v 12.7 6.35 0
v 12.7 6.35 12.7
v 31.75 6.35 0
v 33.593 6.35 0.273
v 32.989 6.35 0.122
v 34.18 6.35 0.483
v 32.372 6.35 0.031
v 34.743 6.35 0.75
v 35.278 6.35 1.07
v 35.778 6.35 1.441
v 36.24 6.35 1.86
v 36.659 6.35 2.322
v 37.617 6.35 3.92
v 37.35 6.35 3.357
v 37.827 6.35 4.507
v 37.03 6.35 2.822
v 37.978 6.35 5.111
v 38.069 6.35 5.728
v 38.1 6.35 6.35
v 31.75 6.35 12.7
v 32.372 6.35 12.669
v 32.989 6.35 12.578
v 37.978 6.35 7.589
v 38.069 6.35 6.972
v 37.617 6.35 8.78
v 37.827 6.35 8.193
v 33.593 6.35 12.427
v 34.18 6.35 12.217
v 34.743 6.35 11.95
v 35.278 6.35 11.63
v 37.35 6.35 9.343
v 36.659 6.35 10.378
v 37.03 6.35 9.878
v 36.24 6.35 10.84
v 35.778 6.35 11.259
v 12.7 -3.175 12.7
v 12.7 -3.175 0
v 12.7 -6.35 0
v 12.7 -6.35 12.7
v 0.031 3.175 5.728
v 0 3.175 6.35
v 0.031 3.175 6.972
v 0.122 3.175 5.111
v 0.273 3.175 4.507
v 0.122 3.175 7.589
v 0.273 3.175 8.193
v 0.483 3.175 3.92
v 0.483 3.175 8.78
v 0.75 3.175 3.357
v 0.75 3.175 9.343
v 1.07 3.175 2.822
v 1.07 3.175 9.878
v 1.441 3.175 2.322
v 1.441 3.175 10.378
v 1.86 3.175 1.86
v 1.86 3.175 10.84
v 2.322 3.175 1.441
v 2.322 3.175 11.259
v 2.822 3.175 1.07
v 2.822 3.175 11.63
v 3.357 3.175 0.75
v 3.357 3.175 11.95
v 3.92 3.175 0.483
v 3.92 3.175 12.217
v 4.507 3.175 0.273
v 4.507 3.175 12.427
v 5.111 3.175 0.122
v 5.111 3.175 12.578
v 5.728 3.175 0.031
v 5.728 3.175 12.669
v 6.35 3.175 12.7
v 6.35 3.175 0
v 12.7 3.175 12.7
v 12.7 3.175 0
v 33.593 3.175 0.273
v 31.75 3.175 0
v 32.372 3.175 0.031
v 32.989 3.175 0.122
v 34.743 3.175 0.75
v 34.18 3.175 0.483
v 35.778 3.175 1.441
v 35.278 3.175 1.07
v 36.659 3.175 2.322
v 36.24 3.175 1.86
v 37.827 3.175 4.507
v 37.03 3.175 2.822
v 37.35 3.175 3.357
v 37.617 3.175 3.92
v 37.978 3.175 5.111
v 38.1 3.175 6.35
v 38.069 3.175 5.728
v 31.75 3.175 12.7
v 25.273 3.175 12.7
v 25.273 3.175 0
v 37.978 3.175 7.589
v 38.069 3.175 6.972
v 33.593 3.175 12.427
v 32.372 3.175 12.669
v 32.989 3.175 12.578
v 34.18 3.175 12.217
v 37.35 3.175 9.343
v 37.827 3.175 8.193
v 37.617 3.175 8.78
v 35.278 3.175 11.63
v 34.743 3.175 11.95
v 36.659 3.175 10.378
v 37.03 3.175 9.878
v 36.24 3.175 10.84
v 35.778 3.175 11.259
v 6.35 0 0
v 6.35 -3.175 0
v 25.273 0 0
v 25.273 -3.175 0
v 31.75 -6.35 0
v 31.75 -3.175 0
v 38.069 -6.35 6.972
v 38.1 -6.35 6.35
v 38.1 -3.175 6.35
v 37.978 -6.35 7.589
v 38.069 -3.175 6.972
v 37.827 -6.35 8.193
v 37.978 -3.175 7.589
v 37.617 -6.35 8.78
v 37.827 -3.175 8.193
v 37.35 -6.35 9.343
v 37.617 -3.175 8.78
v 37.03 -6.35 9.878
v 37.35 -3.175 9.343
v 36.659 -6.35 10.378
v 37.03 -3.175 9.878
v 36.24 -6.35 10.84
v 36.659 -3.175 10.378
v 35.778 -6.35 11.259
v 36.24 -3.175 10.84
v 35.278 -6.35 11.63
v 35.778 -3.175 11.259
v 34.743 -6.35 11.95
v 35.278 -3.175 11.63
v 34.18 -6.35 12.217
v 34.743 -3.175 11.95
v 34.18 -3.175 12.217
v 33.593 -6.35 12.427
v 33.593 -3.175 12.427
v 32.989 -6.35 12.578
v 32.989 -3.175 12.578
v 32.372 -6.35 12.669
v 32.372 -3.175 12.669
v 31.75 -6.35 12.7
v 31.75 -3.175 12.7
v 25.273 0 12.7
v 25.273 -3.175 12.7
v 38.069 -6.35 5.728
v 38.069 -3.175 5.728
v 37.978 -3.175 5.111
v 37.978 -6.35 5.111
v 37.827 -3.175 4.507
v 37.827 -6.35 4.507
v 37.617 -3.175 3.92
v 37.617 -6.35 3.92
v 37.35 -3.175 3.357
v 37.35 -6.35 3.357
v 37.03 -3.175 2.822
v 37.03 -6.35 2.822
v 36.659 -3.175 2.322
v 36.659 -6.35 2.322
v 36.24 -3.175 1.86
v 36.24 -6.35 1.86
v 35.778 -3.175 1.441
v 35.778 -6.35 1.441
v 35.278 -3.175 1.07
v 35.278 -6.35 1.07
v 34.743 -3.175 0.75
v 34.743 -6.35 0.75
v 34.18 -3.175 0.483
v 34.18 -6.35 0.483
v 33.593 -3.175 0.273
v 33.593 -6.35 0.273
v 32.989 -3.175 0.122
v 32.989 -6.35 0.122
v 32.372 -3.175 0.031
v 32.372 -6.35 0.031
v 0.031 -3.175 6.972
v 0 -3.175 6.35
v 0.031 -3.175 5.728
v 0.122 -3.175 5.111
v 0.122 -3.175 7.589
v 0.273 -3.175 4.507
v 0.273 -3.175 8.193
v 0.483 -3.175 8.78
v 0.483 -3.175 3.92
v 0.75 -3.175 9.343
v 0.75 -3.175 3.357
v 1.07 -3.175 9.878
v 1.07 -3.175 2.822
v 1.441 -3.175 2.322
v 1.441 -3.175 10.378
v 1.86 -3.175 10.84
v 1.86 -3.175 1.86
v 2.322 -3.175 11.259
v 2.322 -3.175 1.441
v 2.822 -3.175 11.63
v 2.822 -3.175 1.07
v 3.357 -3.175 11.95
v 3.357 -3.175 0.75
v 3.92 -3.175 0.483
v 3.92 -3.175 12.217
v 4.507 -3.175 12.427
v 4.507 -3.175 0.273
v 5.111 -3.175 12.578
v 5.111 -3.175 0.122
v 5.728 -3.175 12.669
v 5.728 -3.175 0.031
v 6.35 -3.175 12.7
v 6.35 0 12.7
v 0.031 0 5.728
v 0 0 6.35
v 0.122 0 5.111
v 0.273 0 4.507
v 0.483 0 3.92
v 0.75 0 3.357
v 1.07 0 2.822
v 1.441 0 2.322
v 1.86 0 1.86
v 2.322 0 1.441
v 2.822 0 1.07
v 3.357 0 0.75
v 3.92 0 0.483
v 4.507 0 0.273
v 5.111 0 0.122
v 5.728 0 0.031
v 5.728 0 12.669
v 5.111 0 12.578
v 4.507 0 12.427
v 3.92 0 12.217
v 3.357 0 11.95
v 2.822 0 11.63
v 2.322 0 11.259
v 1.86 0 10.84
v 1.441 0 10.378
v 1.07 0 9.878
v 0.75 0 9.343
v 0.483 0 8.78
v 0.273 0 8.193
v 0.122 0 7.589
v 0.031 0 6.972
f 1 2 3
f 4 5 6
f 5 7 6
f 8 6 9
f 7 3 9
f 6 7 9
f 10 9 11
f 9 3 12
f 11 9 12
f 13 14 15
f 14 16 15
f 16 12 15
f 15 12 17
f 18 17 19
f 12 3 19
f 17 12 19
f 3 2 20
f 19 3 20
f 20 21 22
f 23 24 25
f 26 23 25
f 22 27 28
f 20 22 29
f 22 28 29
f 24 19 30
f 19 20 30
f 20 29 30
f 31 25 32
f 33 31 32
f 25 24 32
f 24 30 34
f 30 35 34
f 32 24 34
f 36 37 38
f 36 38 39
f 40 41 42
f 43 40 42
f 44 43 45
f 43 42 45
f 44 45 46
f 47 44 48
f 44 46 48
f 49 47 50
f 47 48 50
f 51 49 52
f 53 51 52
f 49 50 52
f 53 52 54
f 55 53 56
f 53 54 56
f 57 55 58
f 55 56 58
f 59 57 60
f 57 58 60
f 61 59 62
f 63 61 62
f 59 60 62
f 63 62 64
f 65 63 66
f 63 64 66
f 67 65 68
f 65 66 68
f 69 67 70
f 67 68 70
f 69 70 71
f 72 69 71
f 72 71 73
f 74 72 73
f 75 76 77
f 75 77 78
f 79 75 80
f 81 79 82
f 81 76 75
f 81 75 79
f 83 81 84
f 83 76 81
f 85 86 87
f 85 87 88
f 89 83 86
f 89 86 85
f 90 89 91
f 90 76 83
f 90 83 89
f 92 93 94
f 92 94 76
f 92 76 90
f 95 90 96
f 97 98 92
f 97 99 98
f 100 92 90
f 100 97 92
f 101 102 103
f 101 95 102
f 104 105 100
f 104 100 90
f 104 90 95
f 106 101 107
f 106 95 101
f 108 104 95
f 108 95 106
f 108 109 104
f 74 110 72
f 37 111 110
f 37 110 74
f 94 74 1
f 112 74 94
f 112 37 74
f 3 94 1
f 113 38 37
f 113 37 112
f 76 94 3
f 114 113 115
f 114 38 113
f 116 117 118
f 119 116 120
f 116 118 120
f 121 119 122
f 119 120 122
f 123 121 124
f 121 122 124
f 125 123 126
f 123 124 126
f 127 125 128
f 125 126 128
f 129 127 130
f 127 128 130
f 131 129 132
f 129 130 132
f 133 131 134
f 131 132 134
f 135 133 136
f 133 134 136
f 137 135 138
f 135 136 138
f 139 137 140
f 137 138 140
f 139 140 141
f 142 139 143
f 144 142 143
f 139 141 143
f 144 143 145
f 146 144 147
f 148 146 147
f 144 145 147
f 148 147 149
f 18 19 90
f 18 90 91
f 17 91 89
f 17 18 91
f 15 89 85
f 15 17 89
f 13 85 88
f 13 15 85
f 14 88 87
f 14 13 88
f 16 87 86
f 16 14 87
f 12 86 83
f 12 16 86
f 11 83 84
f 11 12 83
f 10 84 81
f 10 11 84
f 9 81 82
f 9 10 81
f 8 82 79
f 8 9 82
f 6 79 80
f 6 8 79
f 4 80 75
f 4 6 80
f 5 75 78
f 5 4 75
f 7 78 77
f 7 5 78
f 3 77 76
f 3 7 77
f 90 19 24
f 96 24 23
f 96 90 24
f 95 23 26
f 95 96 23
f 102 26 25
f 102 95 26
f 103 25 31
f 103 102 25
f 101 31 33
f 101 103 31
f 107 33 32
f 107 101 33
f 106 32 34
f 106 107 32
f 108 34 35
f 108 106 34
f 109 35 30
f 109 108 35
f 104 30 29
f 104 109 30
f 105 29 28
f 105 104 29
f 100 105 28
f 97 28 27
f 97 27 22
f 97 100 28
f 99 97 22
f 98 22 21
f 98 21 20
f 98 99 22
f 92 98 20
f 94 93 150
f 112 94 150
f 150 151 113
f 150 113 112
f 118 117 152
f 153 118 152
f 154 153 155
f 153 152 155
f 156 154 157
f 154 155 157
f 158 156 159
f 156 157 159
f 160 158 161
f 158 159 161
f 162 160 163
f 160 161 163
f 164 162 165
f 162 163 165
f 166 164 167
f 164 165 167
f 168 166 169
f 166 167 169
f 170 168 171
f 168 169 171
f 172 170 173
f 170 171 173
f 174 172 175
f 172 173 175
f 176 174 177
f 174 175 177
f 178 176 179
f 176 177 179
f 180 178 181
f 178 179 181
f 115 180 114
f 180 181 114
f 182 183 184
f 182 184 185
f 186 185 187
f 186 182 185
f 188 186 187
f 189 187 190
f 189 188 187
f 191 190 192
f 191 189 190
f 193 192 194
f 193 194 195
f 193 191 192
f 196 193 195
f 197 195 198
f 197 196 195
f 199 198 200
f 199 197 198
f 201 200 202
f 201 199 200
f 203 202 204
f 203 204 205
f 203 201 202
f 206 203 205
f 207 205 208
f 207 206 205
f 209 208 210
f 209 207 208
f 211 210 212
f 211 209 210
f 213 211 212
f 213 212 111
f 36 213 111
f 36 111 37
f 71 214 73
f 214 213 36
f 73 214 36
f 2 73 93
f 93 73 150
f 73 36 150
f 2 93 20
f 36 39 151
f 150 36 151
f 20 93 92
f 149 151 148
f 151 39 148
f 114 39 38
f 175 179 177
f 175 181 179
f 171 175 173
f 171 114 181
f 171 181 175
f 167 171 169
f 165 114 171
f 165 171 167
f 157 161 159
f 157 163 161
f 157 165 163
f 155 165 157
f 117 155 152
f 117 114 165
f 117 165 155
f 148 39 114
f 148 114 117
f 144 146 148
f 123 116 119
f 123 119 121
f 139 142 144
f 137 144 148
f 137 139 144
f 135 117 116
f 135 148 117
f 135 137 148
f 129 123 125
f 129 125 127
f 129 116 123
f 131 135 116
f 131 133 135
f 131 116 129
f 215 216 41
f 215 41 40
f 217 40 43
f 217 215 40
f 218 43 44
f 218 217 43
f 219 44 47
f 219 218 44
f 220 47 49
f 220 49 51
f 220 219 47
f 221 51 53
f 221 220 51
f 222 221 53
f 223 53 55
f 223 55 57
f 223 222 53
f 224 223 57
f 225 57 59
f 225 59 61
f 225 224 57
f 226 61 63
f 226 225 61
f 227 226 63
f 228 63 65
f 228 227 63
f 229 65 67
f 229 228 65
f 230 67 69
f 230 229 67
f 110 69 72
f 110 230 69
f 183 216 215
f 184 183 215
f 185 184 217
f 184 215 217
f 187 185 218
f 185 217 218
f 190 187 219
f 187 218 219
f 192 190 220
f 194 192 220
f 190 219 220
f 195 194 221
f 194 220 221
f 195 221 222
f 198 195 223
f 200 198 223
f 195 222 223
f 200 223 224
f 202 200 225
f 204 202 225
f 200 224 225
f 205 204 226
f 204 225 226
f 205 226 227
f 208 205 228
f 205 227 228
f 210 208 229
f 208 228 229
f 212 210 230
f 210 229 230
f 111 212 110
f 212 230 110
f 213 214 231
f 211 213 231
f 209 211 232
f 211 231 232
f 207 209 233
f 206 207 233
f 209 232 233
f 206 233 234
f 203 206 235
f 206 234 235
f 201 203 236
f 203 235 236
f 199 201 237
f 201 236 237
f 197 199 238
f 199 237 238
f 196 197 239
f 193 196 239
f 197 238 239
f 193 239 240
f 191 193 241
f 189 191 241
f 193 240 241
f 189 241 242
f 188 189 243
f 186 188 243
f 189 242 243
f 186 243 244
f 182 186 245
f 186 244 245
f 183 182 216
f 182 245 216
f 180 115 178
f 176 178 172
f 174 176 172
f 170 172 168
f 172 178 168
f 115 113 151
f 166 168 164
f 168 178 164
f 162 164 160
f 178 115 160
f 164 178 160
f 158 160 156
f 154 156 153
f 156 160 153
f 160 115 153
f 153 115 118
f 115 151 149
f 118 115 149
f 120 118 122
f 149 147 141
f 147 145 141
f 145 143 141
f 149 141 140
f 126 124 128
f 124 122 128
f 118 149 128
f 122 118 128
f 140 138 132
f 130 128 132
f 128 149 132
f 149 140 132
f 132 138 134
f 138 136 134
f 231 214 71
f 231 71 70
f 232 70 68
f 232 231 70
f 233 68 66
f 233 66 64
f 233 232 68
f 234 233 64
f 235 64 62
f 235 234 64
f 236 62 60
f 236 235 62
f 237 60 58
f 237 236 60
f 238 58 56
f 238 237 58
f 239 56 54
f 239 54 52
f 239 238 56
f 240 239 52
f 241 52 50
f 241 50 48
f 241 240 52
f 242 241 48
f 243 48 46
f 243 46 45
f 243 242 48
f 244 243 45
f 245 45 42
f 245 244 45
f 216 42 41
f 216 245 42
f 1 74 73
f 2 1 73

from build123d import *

# Parameters (mm, degrees)
F1_DEPTH = 3.175
F2_W     = 25.4
F2_H     = 12.7
F3_DEPTH = 3.175
F4_R     = 6.34999
F5_W     = 12.954
F5_H     = 3.175
F6_DEPTH = 25.4


# Not quite as in the source:
# - a fillet or chamfer is up to 0.001 mm smaller than in the source, because OpenCascade refuses the exact size


with BuildPart() as f1:
    # F0 (on Front) → F1 (new body)
    with BuildSketch(Plane.XZ):
        with BuildLine():
            ThreePointArc((0, 6.35), (1.8598719395, 1.8598719395), (6.35, 0))
            Line((6.35, 0), (38.1, 0))
            Line((38.1, 0), (38.1, 12.7))
            Line((38.1, 12.7), (6.35, 12.7))
            ThreePointArc((6.35, 12.7), (1.8598719395, 10.8401280605), (0, 6.35))
        make_face()
    extrude(amount=F1_DEPTH)

    # F2 (on face) → F3 (join)
    with BuildSketch(Plane.XZ.offset(3.175)):
        with Locations((25.4, 6.35)):
            Rectangle(F2_W, F2_H)
    extrude(amount=F3_DEPTH)

    # F4 (radius 6.35 in the source; OpenCascade refuses exactly that, so slightly less here)
    f4_edges = [f1.edges().sort_by_distance(p)[0] for p in [
        (38.1, -3.175, 12.7),
        (38.1, -3.175, 0),
    ]]
    fillet(f4_edges, radius=F4_R)

    # F5 (on face) → F6 (cut)
    with BuildSketch(Plane.XY.offset(12.7)):
        with Locations((31.75, -1.5875)):
            Rectangle(F5_W, F5_H)
    extrude(amount=-F6_DEPTH, mode=Mode.SUBTRACT)

    # F7: F1 across face


with BuildPart() as f1_1:
    add(f1.part)
    add(f1.part.mirror(Plane(origin=(13.2758554346, 0, 6.35), x_dir=(1, 0, 0), z_dir=(0, 1, 0))))


solid = f1_1.part
